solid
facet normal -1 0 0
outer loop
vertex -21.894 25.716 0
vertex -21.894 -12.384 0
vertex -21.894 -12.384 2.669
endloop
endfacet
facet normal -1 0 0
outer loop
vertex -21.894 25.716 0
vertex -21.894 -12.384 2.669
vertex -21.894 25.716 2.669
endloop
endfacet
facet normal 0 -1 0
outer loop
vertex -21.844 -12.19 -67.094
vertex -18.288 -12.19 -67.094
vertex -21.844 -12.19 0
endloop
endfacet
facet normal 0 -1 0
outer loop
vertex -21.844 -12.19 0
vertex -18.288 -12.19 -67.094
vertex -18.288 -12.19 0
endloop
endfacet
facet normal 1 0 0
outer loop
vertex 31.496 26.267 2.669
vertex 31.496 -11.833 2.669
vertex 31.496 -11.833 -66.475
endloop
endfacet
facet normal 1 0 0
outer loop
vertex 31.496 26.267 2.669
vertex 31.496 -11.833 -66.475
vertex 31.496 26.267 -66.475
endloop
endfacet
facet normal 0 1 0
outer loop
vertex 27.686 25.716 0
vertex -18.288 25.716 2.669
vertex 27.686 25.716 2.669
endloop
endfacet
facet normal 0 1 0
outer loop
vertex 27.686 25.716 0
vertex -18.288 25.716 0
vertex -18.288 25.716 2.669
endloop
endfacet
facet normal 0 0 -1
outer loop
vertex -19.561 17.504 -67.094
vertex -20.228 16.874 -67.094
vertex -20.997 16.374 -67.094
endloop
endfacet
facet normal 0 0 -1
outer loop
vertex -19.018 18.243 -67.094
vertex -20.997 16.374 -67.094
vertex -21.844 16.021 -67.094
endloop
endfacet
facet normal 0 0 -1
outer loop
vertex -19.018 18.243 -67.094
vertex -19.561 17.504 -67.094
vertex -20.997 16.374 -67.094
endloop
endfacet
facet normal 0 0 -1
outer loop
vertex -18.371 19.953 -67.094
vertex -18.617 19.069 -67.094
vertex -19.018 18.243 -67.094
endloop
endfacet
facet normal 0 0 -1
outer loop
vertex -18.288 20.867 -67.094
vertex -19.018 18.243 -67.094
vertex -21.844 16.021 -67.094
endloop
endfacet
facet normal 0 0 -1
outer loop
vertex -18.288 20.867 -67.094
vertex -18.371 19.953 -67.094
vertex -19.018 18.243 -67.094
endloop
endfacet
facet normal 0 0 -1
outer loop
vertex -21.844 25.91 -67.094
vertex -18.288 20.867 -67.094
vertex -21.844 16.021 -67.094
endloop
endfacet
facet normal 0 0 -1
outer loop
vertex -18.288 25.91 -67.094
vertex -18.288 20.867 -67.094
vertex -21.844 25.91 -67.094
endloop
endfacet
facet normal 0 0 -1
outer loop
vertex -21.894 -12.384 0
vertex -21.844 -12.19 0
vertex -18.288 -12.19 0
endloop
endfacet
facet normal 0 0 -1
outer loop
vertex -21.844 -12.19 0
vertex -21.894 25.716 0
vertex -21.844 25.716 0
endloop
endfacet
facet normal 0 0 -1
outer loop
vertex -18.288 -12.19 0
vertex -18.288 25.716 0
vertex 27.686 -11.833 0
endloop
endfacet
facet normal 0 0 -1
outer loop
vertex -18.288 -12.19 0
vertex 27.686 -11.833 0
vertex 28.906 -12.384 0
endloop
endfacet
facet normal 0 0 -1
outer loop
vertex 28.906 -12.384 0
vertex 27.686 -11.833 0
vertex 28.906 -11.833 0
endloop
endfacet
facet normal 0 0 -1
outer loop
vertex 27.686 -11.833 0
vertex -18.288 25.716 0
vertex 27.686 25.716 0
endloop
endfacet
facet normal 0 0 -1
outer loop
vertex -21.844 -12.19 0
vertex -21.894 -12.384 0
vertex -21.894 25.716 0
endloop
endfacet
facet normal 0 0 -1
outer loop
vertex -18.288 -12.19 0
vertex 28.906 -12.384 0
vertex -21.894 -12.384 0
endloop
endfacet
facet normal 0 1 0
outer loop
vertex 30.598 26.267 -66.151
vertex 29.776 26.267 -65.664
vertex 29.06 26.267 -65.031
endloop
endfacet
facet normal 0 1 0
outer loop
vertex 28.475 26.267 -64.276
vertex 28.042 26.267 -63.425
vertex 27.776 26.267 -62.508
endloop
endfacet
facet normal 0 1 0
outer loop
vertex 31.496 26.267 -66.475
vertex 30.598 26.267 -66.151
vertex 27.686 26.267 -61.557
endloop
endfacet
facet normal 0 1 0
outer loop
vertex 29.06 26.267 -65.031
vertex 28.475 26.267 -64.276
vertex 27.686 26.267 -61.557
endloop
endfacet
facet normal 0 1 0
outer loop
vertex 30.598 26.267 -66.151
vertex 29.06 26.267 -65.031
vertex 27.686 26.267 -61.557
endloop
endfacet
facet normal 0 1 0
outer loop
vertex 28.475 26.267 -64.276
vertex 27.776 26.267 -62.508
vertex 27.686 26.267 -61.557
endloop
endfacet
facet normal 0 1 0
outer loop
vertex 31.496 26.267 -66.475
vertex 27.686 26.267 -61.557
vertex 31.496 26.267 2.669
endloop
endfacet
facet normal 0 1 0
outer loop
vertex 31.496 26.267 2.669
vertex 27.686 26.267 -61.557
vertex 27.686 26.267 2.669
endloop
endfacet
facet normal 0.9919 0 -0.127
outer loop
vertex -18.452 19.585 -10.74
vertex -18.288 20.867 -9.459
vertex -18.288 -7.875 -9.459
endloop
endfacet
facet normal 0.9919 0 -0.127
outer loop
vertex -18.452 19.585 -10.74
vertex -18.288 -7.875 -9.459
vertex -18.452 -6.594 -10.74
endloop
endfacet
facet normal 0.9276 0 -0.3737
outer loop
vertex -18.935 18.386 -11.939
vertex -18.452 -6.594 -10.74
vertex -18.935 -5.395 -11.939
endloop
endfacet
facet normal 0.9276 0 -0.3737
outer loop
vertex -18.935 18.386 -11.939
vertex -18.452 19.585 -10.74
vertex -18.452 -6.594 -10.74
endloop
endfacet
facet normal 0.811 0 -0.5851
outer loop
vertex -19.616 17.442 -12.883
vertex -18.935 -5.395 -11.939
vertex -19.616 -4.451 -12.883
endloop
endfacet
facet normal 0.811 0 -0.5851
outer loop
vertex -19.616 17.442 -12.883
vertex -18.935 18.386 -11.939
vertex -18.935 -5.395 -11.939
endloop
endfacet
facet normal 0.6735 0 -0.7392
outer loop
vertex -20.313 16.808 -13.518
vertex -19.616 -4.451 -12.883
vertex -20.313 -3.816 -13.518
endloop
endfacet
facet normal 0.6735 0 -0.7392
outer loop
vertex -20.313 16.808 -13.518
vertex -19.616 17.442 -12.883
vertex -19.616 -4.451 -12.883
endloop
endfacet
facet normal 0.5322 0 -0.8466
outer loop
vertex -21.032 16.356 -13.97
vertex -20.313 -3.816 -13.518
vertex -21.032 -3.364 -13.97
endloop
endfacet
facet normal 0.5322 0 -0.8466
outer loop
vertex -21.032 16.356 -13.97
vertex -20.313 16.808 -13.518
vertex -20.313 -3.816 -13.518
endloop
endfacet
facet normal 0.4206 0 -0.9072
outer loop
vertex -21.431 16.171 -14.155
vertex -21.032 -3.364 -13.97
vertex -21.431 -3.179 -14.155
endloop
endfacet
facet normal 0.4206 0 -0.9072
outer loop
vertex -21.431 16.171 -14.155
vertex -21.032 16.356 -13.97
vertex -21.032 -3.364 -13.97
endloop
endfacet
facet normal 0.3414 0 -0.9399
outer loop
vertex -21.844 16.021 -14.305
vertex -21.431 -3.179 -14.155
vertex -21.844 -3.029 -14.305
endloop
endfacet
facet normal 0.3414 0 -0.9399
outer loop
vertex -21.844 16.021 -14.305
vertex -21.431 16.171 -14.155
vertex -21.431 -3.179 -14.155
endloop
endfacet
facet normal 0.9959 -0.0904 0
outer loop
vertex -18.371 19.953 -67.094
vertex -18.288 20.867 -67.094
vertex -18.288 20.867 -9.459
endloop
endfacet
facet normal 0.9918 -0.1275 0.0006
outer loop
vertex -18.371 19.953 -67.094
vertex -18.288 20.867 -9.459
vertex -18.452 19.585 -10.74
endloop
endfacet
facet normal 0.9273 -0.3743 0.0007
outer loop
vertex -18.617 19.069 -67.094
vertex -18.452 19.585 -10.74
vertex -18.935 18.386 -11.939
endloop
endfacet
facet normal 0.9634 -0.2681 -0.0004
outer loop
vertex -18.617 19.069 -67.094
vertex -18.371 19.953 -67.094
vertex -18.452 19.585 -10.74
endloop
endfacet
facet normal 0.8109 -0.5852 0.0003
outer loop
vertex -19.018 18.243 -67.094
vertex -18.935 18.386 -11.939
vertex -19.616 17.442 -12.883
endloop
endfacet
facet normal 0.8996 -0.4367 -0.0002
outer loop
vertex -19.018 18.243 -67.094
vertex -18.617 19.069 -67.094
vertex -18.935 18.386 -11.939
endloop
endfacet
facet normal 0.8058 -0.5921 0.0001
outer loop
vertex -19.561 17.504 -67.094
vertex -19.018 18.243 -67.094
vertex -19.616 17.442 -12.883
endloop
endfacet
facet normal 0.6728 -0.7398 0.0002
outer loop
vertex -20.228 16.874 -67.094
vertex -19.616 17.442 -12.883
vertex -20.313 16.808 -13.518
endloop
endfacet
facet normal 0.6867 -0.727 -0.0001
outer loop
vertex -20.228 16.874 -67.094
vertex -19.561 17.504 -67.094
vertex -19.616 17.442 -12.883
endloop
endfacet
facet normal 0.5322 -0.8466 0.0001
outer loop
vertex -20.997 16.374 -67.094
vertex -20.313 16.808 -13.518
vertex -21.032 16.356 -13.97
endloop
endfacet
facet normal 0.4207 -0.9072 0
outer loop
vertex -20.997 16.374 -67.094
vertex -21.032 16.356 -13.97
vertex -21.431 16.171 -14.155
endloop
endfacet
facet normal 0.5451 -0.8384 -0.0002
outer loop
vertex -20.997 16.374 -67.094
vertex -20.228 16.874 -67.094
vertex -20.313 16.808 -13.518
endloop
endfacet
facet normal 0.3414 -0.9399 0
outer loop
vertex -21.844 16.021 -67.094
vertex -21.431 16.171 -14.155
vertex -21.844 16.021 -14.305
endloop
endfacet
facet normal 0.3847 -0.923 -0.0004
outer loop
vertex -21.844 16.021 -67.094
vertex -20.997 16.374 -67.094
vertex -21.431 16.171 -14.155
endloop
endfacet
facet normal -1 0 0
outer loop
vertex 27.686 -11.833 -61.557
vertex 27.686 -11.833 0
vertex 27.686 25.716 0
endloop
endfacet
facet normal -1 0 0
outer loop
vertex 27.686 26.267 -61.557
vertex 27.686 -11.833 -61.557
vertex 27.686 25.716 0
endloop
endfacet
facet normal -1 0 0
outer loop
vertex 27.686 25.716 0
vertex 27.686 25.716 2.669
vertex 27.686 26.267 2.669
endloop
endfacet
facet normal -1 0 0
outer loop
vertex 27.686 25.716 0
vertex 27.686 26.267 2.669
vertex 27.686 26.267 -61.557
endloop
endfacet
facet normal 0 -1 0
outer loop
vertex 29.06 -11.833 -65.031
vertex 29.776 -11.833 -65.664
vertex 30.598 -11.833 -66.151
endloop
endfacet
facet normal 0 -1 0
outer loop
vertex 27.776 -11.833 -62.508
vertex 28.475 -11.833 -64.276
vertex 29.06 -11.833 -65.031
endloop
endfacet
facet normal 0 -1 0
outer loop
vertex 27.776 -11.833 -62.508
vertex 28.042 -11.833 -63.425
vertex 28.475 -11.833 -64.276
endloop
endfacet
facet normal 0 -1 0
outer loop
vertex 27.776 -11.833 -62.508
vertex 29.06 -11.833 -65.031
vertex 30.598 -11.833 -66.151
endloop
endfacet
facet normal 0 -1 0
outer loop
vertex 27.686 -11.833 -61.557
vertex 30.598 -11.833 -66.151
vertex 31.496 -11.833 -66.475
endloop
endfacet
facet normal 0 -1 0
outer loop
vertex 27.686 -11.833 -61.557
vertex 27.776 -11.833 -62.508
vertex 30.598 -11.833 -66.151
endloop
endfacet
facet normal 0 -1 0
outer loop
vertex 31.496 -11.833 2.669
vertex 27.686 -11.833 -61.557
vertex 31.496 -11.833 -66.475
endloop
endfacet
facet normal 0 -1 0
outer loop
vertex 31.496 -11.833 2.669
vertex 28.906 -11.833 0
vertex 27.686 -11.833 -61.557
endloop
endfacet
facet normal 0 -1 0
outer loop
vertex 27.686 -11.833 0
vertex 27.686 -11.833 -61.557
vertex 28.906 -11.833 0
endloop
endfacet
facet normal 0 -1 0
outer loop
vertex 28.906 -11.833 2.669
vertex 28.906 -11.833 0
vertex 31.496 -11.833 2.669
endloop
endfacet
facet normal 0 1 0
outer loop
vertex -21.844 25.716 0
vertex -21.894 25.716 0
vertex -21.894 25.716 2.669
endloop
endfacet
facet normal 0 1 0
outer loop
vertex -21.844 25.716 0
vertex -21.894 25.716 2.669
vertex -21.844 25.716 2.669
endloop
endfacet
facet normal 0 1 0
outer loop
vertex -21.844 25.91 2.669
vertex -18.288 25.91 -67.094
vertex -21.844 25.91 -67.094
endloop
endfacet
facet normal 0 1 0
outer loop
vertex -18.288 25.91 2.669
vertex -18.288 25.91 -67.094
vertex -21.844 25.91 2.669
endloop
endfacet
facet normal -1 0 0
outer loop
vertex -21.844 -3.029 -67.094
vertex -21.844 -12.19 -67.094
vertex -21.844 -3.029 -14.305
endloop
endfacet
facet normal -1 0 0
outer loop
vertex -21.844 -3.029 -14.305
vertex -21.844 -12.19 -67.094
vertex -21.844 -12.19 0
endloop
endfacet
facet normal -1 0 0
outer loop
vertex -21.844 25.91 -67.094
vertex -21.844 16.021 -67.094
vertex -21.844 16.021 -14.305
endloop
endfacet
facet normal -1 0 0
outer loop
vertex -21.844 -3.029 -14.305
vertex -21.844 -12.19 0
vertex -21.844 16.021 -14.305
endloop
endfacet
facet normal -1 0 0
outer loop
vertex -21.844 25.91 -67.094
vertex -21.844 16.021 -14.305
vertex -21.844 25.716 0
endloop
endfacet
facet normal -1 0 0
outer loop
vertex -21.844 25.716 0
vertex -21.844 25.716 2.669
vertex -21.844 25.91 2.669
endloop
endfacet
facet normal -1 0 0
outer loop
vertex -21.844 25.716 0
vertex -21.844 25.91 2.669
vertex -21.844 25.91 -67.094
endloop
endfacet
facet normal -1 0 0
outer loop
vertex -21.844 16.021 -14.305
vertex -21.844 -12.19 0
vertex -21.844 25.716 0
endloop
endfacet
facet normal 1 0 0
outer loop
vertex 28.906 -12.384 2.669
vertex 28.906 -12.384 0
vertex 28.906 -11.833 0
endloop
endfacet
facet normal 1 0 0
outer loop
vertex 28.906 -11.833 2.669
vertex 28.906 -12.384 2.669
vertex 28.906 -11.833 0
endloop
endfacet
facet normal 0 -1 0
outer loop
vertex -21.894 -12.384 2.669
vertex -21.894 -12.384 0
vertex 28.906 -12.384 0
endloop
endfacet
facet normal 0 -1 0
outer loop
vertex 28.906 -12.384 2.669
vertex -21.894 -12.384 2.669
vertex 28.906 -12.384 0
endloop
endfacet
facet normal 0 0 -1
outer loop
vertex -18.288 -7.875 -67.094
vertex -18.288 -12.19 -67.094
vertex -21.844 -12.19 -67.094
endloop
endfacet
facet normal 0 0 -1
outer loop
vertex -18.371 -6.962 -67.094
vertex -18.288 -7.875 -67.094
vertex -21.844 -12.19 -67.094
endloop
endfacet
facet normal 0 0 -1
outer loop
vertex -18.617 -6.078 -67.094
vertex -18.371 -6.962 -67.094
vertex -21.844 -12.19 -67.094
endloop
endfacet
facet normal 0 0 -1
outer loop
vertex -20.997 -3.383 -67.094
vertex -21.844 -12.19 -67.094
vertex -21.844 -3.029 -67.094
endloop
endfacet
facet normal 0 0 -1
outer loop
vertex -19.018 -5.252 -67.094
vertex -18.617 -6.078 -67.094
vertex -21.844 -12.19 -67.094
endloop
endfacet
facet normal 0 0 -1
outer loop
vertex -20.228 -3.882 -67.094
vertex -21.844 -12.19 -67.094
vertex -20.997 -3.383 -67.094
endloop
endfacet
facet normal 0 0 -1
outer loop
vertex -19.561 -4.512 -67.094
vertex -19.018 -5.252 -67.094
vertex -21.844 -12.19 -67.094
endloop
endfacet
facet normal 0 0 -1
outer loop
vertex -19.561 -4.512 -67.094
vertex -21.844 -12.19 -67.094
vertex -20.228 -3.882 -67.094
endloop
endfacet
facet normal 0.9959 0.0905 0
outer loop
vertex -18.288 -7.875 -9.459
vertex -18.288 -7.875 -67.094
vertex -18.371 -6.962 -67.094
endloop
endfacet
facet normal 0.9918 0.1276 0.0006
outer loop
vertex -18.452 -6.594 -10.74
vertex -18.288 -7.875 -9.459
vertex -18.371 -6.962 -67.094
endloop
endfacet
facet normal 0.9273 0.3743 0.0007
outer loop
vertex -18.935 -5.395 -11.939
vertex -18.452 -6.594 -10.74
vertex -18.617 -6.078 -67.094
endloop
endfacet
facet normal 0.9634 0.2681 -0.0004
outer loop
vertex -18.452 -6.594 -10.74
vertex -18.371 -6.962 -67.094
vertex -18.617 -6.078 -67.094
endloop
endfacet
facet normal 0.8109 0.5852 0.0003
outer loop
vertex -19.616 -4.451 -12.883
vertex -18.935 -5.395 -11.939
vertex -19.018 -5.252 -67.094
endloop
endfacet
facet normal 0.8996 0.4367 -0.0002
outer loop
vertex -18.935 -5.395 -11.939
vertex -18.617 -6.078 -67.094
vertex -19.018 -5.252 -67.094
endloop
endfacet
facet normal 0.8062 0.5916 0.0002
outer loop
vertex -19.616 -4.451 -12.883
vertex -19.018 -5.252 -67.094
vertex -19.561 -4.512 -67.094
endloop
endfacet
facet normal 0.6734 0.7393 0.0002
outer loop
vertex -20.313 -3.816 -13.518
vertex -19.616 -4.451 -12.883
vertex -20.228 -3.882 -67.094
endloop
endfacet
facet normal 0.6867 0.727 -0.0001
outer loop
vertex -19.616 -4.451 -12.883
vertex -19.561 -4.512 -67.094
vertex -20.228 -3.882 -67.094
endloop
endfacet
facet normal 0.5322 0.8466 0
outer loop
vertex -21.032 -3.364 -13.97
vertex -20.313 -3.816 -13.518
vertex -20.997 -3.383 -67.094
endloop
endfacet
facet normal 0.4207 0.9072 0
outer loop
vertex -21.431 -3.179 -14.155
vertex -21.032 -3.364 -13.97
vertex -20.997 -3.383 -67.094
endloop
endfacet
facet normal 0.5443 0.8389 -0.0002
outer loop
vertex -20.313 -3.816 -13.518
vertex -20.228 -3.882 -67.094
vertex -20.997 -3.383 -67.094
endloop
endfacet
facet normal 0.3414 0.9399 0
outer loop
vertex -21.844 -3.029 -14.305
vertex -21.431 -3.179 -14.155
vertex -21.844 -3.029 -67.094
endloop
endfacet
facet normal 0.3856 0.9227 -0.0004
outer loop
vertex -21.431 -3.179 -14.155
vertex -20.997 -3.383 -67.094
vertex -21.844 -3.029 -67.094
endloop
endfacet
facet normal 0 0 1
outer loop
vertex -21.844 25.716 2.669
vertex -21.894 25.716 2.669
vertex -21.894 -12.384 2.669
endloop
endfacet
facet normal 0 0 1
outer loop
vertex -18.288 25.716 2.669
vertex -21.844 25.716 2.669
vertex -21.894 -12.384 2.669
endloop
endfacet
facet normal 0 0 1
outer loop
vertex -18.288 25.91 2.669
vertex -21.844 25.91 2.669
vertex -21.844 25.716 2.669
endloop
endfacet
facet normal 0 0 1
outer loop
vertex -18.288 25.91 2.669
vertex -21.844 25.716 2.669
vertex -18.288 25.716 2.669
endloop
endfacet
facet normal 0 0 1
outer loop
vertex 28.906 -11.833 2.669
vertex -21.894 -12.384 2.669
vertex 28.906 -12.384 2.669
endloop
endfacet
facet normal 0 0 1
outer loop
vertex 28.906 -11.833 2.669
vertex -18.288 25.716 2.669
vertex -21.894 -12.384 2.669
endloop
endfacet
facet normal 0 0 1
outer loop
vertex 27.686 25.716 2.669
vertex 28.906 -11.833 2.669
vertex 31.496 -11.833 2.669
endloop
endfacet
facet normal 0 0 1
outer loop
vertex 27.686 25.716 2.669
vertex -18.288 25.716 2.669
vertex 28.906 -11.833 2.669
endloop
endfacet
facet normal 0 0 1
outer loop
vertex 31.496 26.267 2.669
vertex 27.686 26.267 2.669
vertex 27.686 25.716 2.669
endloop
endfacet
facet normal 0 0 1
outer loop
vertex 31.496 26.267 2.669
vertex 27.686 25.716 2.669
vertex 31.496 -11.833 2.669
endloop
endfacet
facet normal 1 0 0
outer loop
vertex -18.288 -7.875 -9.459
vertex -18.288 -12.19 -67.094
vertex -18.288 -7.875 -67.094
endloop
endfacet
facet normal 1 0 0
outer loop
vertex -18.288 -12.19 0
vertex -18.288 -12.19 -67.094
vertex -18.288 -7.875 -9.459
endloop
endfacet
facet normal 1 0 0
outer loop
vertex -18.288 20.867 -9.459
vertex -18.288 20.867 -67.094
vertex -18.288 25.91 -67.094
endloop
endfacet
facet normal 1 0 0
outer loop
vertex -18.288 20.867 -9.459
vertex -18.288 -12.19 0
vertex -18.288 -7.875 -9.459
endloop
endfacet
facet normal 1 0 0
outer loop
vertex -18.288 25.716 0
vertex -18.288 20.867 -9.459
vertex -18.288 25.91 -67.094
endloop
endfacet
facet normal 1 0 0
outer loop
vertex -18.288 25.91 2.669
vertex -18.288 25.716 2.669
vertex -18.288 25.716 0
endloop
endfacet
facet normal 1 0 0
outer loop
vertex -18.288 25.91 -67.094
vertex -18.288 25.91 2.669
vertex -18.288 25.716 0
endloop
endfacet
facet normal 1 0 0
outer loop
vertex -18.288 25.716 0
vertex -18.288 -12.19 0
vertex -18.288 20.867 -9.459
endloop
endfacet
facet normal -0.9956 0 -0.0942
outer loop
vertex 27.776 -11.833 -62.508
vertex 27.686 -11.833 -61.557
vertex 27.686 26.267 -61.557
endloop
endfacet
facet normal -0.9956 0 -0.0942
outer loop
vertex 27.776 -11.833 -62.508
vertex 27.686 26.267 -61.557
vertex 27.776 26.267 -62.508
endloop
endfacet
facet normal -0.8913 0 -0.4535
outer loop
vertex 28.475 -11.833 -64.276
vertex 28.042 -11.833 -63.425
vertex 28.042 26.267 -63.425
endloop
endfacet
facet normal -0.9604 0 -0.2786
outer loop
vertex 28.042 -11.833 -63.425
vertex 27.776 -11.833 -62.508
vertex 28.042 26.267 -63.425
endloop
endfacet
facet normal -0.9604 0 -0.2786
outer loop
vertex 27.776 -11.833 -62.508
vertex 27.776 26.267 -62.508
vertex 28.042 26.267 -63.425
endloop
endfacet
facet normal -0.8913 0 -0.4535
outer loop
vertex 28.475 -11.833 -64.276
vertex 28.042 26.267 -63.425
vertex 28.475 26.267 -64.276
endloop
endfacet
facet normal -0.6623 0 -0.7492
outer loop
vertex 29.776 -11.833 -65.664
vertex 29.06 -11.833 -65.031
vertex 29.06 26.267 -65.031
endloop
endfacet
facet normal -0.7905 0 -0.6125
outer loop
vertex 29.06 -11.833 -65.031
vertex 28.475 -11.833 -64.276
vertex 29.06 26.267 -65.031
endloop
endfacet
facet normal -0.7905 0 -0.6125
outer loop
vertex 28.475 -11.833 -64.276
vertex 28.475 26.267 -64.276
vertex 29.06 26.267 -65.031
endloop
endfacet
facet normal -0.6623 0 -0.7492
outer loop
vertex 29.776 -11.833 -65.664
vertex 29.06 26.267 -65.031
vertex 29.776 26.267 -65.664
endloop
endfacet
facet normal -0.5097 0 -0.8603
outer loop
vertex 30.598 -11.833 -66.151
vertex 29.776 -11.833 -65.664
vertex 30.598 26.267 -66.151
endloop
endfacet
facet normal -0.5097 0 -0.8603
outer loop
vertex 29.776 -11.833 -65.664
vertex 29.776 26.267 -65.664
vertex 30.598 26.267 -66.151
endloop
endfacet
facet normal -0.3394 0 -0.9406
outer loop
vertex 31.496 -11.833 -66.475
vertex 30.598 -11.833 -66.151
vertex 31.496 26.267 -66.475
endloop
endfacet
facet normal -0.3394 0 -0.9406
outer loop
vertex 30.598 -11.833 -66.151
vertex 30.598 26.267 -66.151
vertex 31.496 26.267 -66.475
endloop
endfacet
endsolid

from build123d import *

# Parameters (mm, degrees)
F0_W           = 50.8
F0_H           = 38.1
F1_DEPTH       = 3.175
F3_START       = -18.288
F2_W           = 38.1
F2_H           = 69.85
F3_DEPTH       = 3.556
F5_START       = 27.686
F4_W           = 38.1
F4_H           = 69.85
F5_DEPTH       = 3.81
F6_W           = 19.05
F6_H           = 53.975
F7_DEPTH       = 32.004
F8_T1_DEPTH    = 64.9044340938
F8_T3_DEPTH    = 19.05
F8_T5_DEPTH    = 62.6934442484
F8_T11_DEPTH   = 64.9044340938
F8_T15_DEPTH   = 31.165027858
F8_T23_DEPTH   = 31.165027858
F8_T28_DEPTH   = 64.9044340938
F9_W           = 54.9304988235
F9_H           = 1.4888443984
F10_DEPTH      = 28.4988
F10_DEPTH_BACK = 25.4


# Not quite as in the source:
# - a fillet or chamfer that OpenCascade refuses, or shapes differently, is made with other operations: its cross-section is extruded or revolved along the edge and cut away or added


with BuildPart() as f1:
    # F0 (on Top) → F1 (new body)
    with BuildSketch(Plane.XY):
        with Locations((3.5055922344, 6.6658267866)):
            Rectangle(F0_W, F0_H)
    extrude(amount=F1_DEPTH)

    # F2 (on Right) → F3 (join)
    with BuildSketch(Plane.YZ.offset(F3_START)):
        with Locations((6.8596902806, -32.1689685807)):
            Rectangle(F2_W, F2_H)
    extrude(amount=-F3_DEPTH)

    # F4 (on Right) → F5 (join)
    with BuildSketch(Plane.YZ.offset(F5_START)):
        with Locations((7.2173965164, -31.5503366292)):
            Rectangle(F4_W, F4_H)
    extrude(amount=F5_DEPTH)

    # F6 (on Right) → F7 (cut)
    with BuildSketch(Plane.YZ):
        with Locations((6.4956571441, -41.2920623448)):
            Rectangle(F6_W, F6_H)
    extrude(amount=-F7_DEPTH, mode=Mode.SUBTRACT)

    # F8: fillet of radius 5.08 on 4 edges, made by hand

    # F8_s2 → F8_t1 (cut)
    with BuildSketch(Plane.XY.offset(-79.2089964387)):
        with BuildLine():
            ThreePointArc((-18.288, 20.8666682873), (-19.2723730639, 17.8612997575), (-21.844, 16.0206571441))
            Line((-21.844, 16.0206571441), (-18.288, 16.0206571441))
            Line((-18.288, 16.0206571441), (-18.288, 20.8666682873))
        make_face()
        with BuildLine():
            ThreePointArc((-18.288, -7.8753539991), (-19.2723730639, -4.8699854693), (-21.844, -3.0293428559))
            Line((-21.844, -3.0293428559), (-18.288, -3.0293428559))
            Line((-18.288, -3.0293428559), (-18.288, -7.8753539991))
        make_face()
    extrude(amount=F8_T1_DEPTH, mode=Mode.SUBTRACT)

    # F8_s4 → F8_t3 (cut)
    with BuildSketch(Plane.XZ.offset(-16.0206571441)):
        with BuildLine():
            ThreePointArc((-18.288, -9.4585512016), (-19.2723730639, -12.4639197314), (-21.844, -14.3045623448))
            Line((-21.844, -14.3045623448), (-18.288, -14.3045623448))
            Line((-18.288, -14.3045623448), (-18.288, -9.4585512016))
        make_face()
    extrude(amount=F8_T3_DEPTH, mode=Mode.SUBTRACT)

    # F8_s6 → F8_t5 (cut)
    with BuildSketch(Plane.XZ.offset(-38.5641186406)):
        with BuildLine():
            ThreePointArc((27.686, -61.5566477795), (28.7499073716, -64.6674997528), (31.496, -66.4753366292))
            Line((31.496, -66.4753366292), (27.686, -66.4753366292))
            Line((27.686, -66.4753366292), (27.686, -61.5566477795))
        make_face()
    extrude(amount=F8_T5_DEPTH, mode=Mode.SUBTRACT)


with BuildPart() as f8_tool9:
    # F8_s10 → F8_t11 (new body)
    with BuildSketch(Plane.XY.offset(-67.0939685807)):
        with BuildLine():
            ThreePointArc((-18.288, 20.8666682873), (-19.2723730639, 17.8612997575), (-21.844, 16.0206571441))
            Line((-21.844, 16.0206571441), (-18.288, 16.0206571441))
            Line((-18.288, 16.0206571441), (-18.288, 20.8666682873))
        make_face()
    extrude(amount=F8_T11_DEPTH)

    split(bisect_by=Plane.XY.offset(-14.3045623448), keep=Keep.TOP)


with BuildPart() as f8_tool13:
    # F8_s14 → F8_t15 (new body)
    with BuildSketch(Plane.XZ.offset(-28.1356850021)):
        with BuildLine():
            ThreePointArc((-18.288, -9.4585512016), (-19.2723730639, -12.4639197314), (-21.844, -14.3045623448))
            Line((-21.844, -14.3045623448), (-18.288, -14.3045623448))
            Line((-18.288, -14.3045623448), (-18.288, -9.4585512016))
        make_face()
    extrude(amount=F8_T15_DEPTH)

    split(bisect_by=Plane.XZ.offset(-25.9096902806), keep=Keep.TOP)

    split(bisect_by=Plane.XZ.offset(-16.0206571441), keep=Keep.BOTTOM)


with BuildPart() as f8_tool9_1:
    add(f8_tool9.part)

    # F8_t18: intersect F8_tool13
    add(f8_tool13.part, mode=Mode.INTERSECT)


with BuildPart() as f1_1:
    add(f1.part)

    # F8_t7: cut F8_tool9
    add(f8_tool9_1.part, mode=Mode.SUBTRACT)


with BuildPart() as f8_tool21:
    # F8_s22 → F8_t23 (new body)
    with BuildSketch(Plane.XZ.offset(-16.0206571441)):
        with BuildLine():
            ThreePointArc((-18.288, -9.4585512016), (-19.2723730639, -12.4639197314), (-21.844, -14.3045623448))
            Line((-21.844, -14.3045623448), (-18.288, -14.3045623448))
            Line((-18.288, -14.3045623448), (-18.288, -9.4585512016))
        make_face()
    extrude(amount=F8_T23_DEPTH)

    split(bisect_by=Plane.XZ.offset(12.1903097194), keep=Keep.BOTTOM)

    split(bisect_by=Plane.XZ.offset(3.0293428559), keep=Keep.TOP)


with BuildPart() as f8_tool26:
    # F8_s27 → F8_t28 (new body)
    with BuildSketch(Plane.XY.offset(-2.1895344868)):
        with BuildLine():
            ThreePointArc((-18.288, -7.8753539991), (-19.2723730639, -4.8699854693), (-21.844, -3.0293428559))
            Line((-21.844, -3.0293428559), (-18.288, -3.0293428559))
            Line((-18.288, -3.0293428559), (-18.288, -7.8753539991))
        make_face()
    extrude(amount=-F8_T28_DEPTH)

    split(bisect_by=Plane.XY.offset(-14.3045623448), keep=Keep.TOP)


with BuildPart() as f8_tool21_1:
    add(f8_tool21.part)

    # F8_t30: intersect F8_tool26
    add(f8_tool26.part, mode=Mode.INTERSECT)


with BuildPart() as f1_2:
    add(f1_1.part)

    # F8_t19: cut F8_tool21
    add(f8_tool21_1.part, mode=Mode.SUBTRACT)

    # F9 (on Front) → F10 (cut, two sides)
    with BuildSketch(Plane.XZ) as f10_sk:
        with Locations((4.6410532668, 3.4134599846)):
            Rectangle(F9_W, F9_H)
    extrude(amount=-F10_DEPTH, mode=Mode.SUBTRACT)
    extrude(f10_sk.sketch, amount=F10_DEPTH_BACK, mode=Mode.SUBTRACT)


solid = f1_2.part
